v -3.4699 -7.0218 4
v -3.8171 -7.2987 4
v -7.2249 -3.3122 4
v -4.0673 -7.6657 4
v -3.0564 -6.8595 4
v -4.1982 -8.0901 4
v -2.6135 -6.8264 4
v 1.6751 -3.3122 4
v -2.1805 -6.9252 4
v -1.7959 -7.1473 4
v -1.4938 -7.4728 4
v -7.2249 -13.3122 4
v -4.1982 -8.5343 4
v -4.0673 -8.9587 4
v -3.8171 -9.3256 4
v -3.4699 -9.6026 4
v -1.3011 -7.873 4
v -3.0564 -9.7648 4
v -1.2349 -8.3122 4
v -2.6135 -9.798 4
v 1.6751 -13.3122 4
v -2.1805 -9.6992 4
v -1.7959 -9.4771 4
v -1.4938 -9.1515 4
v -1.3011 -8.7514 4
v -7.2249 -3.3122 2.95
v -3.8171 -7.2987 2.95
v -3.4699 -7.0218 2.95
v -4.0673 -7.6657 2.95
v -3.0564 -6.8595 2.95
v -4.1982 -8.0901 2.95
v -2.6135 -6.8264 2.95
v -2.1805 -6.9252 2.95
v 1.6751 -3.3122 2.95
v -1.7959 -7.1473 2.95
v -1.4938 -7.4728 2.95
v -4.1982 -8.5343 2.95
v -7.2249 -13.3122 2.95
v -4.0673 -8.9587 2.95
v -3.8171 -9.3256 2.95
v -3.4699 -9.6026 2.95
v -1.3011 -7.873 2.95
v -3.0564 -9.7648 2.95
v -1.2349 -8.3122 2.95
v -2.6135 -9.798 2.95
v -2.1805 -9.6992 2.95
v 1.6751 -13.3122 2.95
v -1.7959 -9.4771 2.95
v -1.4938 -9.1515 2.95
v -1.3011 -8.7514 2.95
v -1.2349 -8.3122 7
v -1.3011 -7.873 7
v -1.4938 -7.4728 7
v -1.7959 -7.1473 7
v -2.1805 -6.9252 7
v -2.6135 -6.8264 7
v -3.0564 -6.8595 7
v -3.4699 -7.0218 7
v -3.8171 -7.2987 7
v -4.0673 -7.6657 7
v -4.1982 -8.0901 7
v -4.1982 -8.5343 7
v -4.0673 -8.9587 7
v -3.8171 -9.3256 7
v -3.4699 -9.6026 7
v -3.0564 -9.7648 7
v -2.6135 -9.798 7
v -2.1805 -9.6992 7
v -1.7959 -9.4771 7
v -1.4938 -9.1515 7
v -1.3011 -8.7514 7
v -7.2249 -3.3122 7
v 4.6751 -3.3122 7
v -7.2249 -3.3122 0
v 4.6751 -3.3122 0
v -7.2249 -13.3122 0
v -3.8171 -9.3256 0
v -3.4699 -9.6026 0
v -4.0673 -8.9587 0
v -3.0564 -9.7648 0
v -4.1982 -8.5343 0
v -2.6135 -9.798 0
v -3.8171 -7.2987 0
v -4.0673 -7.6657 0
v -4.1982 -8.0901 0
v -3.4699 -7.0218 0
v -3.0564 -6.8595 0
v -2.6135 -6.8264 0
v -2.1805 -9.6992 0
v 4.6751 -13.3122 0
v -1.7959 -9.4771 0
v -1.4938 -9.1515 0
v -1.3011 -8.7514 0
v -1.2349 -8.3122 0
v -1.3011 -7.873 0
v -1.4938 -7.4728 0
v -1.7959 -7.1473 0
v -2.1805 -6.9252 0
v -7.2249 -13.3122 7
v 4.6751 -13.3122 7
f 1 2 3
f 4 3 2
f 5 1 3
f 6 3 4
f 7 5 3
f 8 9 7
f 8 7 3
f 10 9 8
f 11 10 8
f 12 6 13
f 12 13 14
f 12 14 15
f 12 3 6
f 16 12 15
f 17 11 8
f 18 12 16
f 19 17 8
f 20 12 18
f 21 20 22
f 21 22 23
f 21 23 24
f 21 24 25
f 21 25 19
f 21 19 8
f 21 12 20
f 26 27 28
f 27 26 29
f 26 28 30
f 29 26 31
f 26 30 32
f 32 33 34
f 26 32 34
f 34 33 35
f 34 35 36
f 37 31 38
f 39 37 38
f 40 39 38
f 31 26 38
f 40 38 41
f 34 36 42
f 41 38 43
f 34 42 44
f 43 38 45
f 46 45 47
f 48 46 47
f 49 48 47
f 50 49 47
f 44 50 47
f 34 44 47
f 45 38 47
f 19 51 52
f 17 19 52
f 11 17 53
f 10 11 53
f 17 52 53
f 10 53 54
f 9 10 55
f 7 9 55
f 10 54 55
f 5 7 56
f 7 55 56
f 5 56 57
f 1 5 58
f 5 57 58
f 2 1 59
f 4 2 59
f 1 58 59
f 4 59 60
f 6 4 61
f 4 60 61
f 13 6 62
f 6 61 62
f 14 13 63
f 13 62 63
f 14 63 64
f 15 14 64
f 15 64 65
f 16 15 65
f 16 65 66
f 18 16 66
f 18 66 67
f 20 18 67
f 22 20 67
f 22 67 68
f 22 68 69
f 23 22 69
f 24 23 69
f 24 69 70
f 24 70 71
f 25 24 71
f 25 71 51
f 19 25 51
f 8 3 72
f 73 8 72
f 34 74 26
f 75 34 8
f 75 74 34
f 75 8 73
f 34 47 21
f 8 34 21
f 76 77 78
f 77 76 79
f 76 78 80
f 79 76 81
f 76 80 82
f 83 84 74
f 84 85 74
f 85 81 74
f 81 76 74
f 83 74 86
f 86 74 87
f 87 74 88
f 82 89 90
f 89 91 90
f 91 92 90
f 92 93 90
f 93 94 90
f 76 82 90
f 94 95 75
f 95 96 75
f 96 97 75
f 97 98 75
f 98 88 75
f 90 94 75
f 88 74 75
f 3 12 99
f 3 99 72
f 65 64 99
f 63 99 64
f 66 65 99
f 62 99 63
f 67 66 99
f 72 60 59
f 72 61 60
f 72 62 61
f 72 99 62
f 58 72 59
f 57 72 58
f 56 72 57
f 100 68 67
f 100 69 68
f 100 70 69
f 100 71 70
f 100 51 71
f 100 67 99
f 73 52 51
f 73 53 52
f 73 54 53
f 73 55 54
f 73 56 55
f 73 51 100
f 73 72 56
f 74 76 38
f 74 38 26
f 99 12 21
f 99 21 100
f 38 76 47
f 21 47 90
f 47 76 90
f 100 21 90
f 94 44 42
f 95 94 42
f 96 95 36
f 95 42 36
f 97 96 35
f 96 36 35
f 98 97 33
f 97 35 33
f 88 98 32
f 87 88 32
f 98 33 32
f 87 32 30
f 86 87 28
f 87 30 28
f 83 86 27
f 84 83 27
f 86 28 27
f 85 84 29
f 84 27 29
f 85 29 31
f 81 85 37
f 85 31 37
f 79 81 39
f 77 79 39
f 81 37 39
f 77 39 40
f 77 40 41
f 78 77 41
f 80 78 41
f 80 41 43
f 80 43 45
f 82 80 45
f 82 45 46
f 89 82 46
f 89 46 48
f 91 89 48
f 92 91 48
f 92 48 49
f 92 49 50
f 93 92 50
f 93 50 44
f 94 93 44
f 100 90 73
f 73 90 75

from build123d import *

# Parameters (mm, degrees)
SKETCH004_W     = 11.9
SKETCH004_H     = 10
PAD002_DEPTH    = 7
SKETCH005_R     = 1.49
POCKET002_DEPTH = 7.001
SKETCH006_W     = 8.9
SKETCH006_H     = 1.05
POCKET003_DEPTH = 10.001


with BuildPart() as part:
    # Sketch004 → Pad002 (new body)
    with BuildSketch(Plane.XY):
        with Locations((-1.274876, -8.312189)):
            Rectangle(SKETCH004_W, SKETCH004_H)
    extrude(amount=PAD002_DEPTH)

    # Sketch005 → Pocket002 (cut, through all)
    with BuildSketch(Plane.XY.offset(7)):
        with Locations((-2.724876, -8.312189)):
            Circle(SKETCH005_R)
    extrude(amount=-POCKET002_DEPTH, mode=Mode.SUBTRACT)

    # Sketch006 → Pocket003 (cut, through all)
    with BuildSketch(Plane.XZ.offset(13.312189)):
        with Locations((-2.774876, 3.475)):
            Rectangle(SKETCH006_W, SKETCH006_H)
    extrude(amount=-POCKET003_DEPTH, mode=Mode.SUBTRACT)


solid = part.part
